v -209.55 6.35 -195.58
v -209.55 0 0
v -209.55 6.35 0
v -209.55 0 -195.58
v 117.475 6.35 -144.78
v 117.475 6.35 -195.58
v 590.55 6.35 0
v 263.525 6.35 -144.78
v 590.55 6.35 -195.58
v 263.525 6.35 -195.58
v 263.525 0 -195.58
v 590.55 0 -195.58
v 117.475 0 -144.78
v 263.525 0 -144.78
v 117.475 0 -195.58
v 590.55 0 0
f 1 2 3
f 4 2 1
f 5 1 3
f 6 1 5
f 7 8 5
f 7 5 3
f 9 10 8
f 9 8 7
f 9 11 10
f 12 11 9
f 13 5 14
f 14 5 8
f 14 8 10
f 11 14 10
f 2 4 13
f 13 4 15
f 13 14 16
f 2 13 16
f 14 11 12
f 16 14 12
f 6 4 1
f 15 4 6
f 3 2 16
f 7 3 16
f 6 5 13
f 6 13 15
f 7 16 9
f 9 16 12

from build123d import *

# Parameters (mm, degrees)
SKETCH5_W           = 381
SKETCH5_H           = 195.58
BOSS_EXTRUDE2_DEPTH = 6.35
SKETCH6_W           = 209.55
SKETCH6_H           = 195.58
BOSS_EXTRUDE3_DEPTH = 6.35
SKETCH7_W           = 209.55
SKETCH7_H           = 195.58
BOSS_EXTRUDE4_DEPTH = 6.35
SKETCH9_W           = 146.05
SKETCH9_H           = 50.8
CUT_EXTRUDE1_DEPTH  = 7.35


with BuildPart() as part:
    # Sketch5 → Boss-Extrude2 (new body)
    with BuildSketch(Plane(origin=(0, 0, 0), x_dir=(1, 0, 0), z_dir=(0, 1, 0))):
        with Locations((190.5, 97.79)):
            Rectangle(SKETCH5_W, SKETCH5_H)
    extrude(amount=BOSS_EXTRUDE2_DEPTH)

    # Sketch6 → Boss-Extrude3 (add)
    with BuildSketch(Plane(origin=(0, 0, 0), x_dir=(1, 0, 0), z_dir=(0, 1, 0))):
        with Locations((485.775, 97.79)):
            Rectangle(SKETCH6_W, SKETCH6_H)
    extrude(amount=BOSS_EXTRUDE3_DEPTH)

    # Sketch7 → Boss-Extrude4 (add)
    with BuildSketch(Plane(origin=(0, 0, 0), x_dir=(1, 0, 0), z_dir=(0, 1, 0))):
        with Locations((-104.775, 97.79)):
            Rectangle(SKETCH7_W, SKETCH7_H)
    extrude(amount=BOSS_EXTRUDE4_DEPTH)

    # Sketch9 → Cut-Extrude1 (cut, through all)
    with BuildSketch(Plane(origin=(0, 6.35, 0), x_dir=(1, 0, 0), z_dir=(0, 1, 0))):
        with Locations((190.5, 170.18)):
            Rectangle(SKETCH9_W, SKETCH9_H)
    extrude(amount=-CUT_EXTRUDE1_DEPTH, mode=Mode.SUBTRACT)


solid = part.part
